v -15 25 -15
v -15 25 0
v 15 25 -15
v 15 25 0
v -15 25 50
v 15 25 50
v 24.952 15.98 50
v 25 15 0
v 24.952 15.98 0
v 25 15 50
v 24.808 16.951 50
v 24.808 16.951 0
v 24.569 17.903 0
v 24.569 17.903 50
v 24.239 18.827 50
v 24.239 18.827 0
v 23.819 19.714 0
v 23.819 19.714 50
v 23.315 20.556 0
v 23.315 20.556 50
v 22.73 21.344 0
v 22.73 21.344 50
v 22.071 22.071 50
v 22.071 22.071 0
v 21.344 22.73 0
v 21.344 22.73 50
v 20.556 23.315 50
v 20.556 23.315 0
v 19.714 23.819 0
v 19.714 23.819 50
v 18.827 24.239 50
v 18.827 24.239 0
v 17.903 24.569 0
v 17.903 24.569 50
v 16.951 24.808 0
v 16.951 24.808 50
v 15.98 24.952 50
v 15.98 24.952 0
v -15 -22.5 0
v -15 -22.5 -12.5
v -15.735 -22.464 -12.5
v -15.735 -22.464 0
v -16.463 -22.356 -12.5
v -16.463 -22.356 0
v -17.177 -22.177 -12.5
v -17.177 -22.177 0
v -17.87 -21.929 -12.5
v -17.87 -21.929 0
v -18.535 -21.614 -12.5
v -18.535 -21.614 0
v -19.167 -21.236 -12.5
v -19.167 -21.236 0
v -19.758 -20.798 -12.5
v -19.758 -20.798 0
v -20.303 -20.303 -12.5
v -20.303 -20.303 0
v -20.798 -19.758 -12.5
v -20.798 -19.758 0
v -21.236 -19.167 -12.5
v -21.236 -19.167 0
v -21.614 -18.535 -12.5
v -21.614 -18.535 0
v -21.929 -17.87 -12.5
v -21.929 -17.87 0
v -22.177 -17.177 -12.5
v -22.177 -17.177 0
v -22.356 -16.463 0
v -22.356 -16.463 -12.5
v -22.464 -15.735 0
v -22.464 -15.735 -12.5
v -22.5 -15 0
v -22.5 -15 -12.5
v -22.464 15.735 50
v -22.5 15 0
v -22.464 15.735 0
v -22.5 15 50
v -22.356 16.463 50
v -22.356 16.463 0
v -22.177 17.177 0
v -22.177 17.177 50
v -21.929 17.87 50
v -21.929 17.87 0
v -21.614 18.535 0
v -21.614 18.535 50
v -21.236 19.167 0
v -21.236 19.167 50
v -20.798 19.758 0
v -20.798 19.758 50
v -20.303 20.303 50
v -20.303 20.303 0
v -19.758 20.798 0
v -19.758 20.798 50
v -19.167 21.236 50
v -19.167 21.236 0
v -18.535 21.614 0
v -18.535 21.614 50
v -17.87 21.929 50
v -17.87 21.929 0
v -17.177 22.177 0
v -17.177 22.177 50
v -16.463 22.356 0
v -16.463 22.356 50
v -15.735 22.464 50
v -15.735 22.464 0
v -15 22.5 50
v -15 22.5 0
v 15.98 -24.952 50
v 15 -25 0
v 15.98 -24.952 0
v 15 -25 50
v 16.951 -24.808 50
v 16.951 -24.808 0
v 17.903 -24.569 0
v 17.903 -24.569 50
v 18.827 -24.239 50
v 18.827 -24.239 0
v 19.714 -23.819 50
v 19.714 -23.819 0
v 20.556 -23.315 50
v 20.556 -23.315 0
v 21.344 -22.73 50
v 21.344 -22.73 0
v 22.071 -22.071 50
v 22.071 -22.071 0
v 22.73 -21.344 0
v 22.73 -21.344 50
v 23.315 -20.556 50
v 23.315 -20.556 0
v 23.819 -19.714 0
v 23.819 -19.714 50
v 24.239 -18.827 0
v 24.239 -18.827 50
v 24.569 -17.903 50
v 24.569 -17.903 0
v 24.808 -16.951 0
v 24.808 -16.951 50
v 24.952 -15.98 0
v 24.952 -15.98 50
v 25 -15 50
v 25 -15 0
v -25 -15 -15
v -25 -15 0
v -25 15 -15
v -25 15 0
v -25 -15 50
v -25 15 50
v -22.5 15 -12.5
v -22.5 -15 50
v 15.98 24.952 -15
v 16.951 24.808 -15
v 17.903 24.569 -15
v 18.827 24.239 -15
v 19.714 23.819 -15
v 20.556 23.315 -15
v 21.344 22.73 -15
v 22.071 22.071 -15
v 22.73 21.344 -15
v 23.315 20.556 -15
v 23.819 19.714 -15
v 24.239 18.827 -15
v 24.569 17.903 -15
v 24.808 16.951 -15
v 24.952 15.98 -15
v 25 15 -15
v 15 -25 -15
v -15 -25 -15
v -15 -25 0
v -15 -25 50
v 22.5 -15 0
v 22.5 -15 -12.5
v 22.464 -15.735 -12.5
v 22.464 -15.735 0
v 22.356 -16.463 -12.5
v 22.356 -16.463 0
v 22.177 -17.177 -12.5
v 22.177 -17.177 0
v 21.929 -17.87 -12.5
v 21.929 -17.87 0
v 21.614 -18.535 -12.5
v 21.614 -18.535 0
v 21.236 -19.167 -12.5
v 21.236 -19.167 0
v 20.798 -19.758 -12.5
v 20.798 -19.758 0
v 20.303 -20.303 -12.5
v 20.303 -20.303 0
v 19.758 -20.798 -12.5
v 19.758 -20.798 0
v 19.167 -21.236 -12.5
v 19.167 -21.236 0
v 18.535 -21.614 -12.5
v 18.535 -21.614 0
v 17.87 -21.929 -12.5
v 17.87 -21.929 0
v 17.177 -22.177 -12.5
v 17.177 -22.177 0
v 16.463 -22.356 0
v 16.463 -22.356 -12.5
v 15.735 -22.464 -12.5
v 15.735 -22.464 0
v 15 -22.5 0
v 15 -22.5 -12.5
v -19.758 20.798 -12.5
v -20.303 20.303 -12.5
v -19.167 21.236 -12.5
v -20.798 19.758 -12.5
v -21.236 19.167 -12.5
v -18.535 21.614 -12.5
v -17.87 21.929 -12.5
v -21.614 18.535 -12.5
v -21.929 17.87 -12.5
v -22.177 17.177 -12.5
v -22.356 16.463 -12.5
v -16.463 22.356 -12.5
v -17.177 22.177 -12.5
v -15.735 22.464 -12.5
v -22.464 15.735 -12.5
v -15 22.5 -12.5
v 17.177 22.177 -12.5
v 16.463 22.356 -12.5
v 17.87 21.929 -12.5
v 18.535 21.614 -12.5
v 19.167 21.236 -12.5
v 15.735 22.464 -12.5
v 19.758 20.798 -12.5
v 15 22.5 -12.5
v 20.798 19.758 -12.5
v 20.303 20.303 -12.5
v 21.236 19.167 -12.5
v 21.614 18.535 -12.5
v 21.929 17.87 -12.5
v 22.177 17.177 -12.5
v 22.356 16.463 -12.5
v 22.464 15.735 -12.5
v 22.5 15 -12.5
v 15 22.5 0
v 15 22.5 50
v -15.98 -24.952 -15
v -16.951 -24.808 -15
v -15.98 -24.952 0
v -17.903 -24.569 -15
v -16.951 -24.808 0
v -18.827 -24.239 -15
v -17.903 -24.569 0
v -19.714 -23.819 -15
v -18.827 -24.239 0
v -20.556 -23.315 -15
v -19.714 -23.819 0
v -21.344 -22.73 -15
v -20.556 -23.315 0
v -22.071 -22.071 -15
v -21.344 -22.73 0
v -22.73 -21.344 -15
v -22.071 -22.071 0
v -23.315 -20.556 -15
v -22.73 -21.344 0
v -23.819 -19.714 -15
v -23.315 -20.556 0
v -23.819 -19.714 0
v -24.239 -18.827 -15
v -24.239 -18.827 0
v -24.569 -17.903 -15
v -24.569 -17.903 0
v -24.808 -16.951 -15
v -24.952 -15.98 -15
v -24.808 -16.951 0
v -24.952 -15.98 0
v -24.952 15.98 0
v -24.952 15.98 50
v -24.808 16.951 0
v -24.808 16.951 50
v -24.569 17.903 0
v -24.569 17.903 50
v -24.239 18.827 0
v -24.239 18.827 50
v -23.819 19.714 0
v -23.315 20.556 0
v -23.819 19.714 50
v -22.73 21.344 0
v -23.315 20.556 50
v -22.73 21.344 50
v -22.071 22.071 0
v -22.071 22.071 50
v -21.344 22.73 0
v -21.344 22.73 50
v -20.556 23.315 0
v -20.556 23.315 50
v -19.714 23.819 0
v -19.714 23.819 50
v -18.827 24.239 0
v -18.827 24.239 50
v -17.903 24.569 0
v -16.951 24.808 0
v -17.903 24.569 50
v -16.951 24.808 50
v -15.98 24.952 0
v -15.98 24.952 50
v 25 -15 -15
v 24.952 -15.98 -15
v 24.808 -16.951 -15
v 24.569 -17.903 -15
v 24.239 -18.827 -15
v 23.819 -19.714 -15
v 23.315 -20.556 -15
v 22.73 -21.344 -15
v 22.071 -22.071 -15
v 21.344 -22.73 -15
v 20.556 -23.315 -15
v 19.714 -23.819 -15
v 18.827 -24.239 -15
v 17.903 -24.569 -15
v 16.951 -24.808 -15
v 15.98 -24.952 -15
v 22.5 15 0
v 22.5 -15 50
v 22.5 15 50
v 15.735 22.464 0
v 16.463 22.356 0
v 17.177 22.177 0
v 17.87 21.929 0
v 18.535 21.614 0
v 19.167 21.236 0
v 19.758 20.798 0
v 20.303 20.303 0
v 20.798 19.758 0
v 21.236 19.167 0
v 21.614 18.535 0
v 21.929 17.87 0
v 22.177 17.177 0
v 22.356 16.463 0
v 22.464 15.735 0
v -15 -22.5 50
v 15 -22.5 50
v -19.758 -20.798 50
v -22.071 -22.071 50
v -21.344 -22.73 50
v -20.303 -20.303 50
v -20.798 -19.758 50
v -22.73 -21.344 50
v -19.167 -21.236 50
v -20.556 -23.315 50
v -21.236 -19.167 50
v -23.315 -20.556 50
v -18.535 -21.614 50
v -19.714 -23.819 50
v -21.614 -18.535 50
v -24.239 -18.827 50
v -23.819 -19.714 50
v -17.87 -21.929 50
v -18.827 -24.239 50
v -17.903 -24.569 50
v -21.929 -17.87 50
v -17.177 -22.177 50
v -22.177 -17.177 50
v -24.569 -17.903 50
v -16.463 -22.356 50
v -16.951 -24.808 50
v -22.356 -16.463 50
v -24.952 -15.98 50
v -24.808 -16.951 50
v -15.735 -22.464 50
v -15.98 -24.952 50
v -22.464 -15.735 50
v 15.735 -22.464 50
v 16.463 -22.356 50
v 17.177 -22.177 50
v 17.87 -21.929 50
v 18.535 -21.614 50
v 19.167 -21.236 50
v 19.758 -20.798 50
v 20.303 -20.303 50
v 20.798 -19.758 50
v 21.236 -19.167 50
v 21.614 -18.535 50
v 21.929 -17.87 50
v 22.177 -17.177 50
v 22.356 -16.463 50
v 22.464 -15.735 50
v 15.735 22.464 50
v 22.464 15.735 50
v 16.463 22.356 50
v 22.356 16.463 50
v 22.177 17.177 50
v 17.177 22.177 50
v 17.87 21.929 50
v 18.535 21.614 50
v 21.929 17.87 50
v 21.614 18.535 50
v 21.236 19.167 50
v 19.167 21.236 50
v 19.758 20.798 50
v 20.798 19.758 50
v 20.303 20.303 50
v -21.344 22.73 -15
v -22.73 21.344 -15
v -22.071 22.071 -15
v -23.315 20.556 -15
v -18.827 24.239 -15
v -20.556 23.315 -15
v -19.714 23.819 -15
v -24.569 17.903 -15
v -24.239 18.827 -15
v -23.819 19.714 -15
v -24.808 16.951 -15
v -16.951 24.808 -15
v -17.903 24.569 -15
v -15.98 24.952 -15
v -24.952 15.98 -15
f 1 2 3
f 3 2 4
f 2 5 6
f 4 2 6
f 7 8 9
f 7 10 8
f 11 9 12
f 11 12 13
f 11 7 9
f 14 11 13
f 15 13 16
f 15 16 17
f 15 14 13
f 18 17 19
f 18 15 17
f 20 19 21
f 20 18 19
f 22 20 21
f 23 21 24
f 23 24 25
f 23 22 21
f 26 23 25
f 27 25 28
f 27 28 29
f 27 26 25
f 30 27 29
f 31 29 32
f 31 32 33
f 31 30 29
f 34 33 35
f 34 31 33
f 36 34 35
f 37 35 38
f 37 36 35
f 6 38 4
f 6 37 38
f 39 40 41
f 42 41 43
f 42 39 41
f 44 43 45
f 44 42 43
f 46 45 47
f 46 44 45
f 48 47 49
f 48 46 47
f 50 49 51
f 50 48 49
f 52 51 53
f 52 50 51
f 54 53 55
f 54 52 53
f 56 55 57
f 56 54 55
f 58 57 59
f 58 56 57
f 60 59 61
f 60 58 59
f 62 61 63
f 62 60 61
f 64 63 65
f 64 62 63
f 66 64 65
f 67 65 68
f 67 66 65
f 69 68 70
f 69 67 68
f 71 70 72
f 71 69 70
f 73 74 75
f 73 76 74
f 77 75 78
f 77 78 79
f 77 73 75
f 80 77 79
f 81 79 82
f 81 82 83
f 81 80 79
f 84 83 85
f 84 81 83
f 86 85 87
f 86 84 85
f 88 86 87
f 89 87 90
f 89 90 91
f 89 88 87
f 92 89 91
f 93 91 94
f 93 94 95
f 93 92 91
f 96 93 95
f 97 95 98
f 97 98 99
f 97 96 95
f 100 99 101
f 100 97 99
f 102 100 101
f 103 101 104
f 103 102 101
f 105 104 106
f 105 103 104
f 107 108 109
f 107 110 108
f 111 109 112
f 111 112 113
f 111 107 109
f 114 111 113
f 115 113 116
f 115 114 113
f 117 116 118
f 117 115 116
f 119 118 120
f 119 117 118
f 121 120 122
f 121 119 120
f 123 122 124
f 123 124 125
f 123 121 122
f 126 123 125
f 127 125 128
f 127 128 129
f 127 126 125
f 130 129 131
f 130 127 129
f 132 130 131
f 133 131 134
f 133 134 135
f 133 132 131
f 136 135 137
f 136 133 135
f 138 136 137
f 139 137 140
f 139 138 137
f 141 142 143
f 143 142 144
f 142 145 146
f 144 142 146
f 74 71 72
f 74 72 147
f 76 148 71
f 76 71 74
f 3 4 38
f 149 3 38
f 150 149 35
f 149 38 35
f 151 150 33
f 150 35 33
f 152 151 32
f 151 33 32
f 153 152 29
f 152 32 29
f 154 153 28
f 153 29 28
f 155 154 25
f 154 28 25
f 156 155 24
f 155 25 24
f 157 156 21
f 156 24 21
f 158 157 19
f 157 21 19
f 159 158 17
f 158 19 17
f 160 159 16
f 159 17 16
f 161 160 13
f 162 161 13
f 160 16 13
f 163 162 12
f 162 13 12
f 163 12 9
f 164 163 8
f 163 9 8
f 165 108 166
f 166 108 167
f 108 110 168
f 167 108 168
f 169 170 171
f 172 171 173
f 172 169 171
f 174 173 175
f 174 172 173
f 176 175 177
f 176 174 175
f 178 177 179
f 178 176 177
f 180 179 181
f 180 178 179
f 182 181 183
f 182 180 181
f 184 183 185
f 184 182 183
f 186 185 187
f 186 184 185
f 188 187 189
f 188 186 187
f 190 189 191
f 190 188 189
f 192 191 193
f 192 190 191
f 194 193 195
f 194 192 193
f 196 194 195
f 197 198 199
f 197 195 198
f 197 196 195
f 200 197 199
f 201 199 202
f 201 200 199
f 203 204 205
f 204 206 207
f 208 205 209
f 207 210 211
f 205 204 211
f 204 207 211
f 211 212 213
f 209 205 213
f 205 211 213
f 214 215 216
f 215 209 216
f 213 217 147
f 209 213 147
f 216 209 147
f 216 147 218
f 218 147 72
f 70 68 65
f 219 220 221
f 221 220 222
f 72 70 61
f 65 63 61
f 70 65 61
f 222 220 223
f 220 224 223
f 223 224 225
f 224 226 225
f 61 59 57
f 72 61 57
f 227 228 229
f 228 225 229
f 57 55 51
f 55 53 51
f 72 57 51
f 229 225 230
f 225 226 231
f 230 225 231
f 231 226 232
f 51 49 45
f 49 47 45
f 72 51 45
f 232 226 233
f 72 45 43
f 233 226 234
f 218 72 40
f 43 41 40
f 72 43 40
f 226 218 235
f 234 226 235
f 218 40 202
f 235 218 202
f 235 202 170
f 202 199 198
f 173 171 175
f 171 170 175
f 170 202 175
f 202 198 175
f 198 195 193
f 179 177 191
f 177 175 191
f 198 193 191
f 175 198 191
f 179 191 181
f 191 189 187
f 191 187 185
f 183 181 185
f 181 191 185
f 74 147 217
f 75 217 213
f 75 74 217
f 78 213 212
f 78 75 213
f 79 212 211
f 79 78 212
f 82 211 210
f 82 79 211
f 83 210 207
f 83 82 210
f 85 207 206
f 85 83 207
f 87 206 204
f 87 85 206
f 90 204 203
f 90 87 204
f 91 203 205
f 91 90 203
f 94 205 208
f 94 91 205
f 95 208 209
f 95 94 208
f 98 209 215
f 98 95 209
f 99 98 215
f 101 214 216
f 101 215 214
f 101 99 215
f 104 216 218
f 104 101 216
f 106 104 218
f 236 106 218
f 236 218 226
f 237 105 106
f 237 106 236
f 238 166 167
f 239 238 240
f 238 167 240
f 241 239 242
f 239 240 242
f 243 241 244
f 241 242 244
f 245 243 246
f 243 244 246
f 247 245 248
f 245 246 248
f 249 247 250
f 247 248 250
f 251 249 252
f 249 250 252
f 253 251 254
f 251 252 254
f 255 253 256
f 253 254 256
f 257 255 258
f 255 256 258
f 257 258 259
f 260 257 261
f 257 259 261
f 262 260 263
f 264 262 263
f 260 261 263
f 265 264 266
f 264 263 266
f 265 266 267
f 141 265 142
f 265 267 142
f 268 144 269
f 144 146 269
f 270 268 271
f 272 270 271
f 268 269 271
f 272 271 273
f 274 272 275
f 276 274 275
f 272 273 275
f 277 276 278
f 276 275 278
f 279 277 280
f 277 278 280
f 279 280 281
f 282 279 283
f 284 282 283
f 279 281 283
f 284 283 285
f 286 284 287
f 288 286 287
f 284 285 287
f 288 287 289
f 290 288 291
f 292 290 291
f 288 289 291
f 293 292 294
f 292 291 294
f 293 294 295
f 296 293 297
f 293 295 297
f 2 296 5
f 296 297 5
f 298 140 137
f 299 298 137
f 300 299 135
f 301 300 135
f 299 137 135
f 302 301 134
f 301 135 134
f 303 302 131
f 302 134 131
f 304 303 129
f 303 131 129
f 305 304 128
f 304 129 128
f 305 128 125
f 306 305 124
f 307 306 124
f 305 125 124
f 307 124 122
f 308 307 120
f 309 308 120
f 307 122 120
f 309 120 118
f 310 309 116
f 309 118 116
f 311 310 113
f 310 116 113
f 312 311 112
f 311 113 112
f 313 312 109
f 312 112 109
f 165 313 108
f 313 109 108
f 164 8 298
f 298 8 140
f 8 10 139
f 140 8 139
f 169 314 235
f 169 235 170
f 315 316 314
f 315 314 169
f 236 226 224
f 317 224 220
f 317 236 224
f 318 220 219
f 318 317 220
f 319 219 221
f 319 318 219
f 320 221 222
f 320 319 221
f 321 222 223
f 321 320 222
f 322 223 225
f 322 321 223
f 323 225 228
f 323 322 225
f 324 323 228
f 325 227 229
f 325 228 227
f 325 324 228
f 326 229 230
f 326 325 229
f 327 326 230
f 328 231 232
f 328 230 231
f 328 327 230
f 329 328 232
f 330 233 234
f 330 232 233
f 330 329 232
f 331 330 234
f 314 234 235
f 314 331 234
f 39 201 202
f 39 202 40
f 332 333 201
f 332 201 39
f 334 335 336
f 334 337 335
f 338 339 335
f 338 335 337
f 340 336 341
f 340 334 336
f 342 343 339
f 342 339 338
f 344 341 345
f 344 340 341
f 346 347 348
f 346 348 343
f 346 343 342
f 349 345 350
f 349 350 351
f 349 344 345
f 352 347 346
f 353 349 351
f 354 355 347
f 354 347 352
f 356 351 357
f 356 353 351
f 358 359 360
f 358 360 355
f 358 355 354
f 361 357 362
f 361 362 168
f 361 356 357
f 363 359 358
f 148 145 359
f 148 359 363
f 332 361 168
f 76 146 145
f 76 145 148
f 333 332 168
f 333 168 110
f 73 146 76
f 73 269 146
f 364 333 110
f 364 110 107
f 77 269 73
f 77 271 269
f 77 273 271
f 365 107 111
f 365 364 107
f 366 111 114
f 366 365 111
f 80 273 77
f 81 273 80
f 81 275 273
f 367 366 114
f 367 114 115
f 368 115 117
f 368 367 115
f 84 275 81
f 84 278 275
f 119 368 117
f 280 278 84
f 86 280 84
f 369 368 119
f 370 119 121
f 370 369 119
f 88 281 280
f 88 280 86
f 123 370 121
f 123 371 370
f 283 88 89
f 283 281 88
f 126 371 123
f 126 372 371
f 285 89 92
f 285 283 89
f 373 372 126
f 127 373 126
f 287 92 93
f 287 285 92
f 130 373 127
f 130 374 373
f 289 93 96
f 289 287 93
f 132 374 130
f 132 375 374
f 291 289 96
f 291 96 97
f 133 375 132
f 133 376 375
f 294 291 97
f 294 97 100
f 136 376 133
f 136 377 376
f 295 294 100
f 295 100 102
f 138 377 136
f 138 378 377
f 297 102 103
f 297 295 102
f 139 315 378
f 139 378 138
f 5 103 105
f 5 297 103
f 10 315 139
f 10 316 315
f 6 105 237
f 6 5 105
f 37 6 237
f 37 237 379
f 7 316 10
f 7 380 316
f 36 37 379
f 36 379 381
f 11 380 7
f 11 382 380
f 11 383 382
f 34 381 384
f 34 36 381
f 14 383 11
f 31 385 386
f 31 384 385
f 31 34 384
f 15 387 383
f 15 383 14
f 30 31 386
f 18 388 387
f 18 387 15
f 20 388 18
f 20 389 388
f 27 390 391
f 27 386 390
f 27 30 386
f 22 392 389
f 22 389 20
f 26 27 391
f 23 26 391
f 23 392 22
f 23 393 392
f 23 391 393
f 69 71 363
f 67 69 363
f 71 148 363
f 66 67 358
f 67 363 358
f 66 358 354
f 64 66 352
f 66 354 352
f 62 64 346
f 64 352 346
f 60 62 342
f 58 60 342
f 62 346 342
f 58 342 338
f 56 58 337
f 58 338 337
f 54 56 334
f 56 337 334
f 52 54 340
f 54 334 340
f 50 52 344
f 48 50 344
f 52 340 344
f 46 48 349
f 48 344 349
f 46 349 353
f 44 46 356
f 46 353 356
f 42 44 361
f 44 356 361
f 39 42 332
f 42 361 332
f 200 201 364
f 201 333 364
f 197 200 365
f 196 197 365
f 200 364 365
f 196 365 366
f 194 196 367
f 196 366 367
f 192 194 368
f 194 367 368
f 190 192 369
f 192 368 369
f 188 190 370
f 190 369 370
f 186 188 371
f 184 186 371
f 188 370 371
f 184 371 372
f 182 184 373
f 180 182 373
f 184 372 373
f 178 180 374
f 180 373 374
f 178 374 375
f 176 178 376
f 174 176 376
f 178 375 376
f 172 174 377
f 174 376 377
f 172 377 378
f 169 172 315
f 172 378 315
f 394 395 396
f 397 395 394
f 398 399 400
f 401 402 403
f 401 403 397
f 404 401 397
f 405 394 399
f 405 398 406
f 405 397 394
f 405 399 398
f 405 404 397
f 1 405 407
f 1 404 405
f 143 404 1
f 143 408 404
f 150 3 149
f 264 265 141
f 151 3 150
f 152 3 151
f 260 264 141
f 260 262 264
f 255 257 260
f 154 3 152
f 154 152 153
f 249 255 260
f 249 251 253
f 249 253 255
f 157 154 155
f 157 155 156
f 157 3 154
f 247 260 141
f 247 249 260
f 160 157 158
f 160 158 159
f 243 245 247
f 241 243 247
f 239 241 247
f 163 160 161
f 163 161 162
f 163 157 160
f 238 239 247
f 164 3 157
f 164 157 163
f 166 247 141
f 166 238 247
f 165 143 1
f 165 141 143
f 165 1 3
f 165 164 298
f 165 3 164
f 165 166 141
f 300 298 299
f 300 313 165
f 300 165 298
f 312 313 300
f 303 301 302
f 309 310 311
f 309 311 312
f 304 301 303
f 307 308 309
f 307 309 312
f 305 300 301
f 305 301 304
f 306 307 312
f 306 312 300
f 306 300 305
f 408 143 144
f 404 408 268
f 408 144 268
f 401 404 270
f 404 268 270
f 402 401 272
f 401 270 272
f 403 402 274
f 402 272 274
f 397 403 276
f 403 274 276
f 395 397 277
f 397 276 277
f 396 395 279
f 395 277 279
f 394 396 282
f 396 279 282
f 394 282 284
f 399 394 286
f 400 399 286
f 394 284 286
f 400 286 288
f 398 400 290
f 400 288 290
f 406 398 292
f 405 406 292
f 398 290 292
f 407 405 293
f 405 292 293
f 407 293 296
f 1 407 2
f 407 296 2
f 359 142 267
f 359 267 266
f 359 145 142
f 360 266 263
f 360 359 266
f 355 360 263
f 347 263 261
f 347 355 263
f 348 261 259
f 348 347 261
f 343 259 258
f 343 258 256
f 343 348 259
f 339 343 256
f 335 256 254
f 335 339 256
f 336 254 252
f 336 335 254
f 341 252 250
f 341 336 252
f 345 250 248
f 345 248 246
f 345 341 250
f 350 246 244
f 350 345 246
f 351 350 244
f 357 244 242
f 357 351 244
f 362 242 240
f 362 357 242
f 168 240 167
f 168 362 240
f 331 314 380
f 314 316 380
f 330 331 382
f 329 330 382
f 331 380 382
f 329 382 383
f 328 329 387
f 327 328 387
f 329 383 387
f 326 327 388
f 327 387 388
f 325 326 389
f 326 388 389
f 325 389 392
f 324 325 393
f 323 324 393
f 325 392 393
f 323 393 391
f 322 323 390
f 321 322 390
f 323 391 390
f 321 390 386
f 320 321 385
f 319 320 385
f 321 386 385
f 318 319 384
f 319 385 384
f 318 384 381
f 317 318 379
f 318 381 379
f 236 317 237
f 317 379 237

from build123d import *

# Parameters (mm, degrees)
F0_W     = 50
F0_H     = 50
F1_DEPTH = 50
F2_R     = 10
F3_DEPTH = 15
F4_T     = -2.5


with BuildPart() as f1:
    # F0 (on Top) → F1 (new body)
    with BuildSketch(Plane.XY):
        Rectangle(F0_W, F0_H)
    extrude(amount=F1_DEPTH)

    # F2
    f2_edges = [f1.edges().sort_by_distance(p)[0] for p in [
        (-25, -25, 25),
        (-25, 25, 25),
        (25, 25, 25),
        (25, -25, 25),
    ]]
    fillet(f2_edges, radius=F2_R)

    # F1_face (on face) → F3 (join)
    with BuildSketch(Plane(origin=(0, 0, 0), x_dir=(1, 0, 0), z_dir=(0, 0, -1))):
        with BuildLine():
            Line((-25, 15), (-25, -15))
            ThreePointArc((-25, -15), (-22.071068, -22.071068), (-15, -25))
            Line((-15, -25), (15, -25))
            ThreePointArc((15, -25), (22.071068, -22.071068), (25, -15))
            Line((25, -15), (25, 15))
            ThreePointArc((25, 15), (22.071068, 22.071068), (15, 25))
            Line((15, 25), (-15, 25))
            ThreePointArc((-15, 25), (-22.071068, 22.071068), (-25, 15))
        make_face()
    extrude(amount=F3_DEPTH)

    # F4
    f4_openings = [f1.faces().sort_by_distance(p)[0] for p in [
        (0, 0, 50),
    ]]
    offset(amount=F4_T, openings=f4_openings)


solid = f1.part
